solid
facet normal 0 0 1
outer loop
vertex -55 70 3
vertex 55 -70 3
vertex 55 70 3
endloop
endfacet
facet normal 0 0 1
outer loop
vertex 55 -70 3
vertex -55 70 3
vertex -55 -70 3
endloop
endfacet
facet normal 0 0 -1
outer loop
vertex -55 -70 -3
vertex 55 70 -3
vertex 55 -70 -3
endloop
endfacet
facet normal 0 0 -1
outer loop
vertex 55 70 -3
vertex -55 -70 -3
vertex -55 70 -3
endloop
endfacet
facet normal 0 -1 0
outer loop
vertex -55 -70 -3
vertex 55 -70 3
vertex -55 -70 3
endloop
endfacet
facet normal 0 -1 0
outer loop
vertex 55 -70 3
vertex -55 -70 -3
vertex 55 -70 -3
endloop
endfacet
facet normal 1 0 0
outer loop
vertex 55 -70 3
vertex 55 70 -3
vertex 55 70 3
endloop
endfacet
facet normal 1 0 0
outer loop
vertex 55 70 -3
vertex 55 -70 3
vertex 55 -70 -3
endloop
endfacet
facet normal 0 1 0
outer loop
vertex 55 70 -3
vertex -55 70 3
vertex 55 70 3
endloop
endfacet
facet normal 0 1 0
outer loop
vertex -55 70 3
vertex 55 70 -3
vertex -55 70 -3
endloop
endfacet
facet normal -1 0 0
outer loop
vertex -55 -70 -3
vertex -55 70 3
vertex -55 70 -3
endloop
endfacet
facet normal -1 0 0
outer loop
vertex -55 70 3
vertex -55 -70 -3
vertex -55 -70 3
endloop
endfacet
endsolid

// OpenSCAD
// ========================================
// a 110 x 140 x 6 mm plate
// NeuroCAD canonical IR; dimensions are millimetres
// ========================================
$fn = 48;

cube(size=[110, 140, 6], center=true);
